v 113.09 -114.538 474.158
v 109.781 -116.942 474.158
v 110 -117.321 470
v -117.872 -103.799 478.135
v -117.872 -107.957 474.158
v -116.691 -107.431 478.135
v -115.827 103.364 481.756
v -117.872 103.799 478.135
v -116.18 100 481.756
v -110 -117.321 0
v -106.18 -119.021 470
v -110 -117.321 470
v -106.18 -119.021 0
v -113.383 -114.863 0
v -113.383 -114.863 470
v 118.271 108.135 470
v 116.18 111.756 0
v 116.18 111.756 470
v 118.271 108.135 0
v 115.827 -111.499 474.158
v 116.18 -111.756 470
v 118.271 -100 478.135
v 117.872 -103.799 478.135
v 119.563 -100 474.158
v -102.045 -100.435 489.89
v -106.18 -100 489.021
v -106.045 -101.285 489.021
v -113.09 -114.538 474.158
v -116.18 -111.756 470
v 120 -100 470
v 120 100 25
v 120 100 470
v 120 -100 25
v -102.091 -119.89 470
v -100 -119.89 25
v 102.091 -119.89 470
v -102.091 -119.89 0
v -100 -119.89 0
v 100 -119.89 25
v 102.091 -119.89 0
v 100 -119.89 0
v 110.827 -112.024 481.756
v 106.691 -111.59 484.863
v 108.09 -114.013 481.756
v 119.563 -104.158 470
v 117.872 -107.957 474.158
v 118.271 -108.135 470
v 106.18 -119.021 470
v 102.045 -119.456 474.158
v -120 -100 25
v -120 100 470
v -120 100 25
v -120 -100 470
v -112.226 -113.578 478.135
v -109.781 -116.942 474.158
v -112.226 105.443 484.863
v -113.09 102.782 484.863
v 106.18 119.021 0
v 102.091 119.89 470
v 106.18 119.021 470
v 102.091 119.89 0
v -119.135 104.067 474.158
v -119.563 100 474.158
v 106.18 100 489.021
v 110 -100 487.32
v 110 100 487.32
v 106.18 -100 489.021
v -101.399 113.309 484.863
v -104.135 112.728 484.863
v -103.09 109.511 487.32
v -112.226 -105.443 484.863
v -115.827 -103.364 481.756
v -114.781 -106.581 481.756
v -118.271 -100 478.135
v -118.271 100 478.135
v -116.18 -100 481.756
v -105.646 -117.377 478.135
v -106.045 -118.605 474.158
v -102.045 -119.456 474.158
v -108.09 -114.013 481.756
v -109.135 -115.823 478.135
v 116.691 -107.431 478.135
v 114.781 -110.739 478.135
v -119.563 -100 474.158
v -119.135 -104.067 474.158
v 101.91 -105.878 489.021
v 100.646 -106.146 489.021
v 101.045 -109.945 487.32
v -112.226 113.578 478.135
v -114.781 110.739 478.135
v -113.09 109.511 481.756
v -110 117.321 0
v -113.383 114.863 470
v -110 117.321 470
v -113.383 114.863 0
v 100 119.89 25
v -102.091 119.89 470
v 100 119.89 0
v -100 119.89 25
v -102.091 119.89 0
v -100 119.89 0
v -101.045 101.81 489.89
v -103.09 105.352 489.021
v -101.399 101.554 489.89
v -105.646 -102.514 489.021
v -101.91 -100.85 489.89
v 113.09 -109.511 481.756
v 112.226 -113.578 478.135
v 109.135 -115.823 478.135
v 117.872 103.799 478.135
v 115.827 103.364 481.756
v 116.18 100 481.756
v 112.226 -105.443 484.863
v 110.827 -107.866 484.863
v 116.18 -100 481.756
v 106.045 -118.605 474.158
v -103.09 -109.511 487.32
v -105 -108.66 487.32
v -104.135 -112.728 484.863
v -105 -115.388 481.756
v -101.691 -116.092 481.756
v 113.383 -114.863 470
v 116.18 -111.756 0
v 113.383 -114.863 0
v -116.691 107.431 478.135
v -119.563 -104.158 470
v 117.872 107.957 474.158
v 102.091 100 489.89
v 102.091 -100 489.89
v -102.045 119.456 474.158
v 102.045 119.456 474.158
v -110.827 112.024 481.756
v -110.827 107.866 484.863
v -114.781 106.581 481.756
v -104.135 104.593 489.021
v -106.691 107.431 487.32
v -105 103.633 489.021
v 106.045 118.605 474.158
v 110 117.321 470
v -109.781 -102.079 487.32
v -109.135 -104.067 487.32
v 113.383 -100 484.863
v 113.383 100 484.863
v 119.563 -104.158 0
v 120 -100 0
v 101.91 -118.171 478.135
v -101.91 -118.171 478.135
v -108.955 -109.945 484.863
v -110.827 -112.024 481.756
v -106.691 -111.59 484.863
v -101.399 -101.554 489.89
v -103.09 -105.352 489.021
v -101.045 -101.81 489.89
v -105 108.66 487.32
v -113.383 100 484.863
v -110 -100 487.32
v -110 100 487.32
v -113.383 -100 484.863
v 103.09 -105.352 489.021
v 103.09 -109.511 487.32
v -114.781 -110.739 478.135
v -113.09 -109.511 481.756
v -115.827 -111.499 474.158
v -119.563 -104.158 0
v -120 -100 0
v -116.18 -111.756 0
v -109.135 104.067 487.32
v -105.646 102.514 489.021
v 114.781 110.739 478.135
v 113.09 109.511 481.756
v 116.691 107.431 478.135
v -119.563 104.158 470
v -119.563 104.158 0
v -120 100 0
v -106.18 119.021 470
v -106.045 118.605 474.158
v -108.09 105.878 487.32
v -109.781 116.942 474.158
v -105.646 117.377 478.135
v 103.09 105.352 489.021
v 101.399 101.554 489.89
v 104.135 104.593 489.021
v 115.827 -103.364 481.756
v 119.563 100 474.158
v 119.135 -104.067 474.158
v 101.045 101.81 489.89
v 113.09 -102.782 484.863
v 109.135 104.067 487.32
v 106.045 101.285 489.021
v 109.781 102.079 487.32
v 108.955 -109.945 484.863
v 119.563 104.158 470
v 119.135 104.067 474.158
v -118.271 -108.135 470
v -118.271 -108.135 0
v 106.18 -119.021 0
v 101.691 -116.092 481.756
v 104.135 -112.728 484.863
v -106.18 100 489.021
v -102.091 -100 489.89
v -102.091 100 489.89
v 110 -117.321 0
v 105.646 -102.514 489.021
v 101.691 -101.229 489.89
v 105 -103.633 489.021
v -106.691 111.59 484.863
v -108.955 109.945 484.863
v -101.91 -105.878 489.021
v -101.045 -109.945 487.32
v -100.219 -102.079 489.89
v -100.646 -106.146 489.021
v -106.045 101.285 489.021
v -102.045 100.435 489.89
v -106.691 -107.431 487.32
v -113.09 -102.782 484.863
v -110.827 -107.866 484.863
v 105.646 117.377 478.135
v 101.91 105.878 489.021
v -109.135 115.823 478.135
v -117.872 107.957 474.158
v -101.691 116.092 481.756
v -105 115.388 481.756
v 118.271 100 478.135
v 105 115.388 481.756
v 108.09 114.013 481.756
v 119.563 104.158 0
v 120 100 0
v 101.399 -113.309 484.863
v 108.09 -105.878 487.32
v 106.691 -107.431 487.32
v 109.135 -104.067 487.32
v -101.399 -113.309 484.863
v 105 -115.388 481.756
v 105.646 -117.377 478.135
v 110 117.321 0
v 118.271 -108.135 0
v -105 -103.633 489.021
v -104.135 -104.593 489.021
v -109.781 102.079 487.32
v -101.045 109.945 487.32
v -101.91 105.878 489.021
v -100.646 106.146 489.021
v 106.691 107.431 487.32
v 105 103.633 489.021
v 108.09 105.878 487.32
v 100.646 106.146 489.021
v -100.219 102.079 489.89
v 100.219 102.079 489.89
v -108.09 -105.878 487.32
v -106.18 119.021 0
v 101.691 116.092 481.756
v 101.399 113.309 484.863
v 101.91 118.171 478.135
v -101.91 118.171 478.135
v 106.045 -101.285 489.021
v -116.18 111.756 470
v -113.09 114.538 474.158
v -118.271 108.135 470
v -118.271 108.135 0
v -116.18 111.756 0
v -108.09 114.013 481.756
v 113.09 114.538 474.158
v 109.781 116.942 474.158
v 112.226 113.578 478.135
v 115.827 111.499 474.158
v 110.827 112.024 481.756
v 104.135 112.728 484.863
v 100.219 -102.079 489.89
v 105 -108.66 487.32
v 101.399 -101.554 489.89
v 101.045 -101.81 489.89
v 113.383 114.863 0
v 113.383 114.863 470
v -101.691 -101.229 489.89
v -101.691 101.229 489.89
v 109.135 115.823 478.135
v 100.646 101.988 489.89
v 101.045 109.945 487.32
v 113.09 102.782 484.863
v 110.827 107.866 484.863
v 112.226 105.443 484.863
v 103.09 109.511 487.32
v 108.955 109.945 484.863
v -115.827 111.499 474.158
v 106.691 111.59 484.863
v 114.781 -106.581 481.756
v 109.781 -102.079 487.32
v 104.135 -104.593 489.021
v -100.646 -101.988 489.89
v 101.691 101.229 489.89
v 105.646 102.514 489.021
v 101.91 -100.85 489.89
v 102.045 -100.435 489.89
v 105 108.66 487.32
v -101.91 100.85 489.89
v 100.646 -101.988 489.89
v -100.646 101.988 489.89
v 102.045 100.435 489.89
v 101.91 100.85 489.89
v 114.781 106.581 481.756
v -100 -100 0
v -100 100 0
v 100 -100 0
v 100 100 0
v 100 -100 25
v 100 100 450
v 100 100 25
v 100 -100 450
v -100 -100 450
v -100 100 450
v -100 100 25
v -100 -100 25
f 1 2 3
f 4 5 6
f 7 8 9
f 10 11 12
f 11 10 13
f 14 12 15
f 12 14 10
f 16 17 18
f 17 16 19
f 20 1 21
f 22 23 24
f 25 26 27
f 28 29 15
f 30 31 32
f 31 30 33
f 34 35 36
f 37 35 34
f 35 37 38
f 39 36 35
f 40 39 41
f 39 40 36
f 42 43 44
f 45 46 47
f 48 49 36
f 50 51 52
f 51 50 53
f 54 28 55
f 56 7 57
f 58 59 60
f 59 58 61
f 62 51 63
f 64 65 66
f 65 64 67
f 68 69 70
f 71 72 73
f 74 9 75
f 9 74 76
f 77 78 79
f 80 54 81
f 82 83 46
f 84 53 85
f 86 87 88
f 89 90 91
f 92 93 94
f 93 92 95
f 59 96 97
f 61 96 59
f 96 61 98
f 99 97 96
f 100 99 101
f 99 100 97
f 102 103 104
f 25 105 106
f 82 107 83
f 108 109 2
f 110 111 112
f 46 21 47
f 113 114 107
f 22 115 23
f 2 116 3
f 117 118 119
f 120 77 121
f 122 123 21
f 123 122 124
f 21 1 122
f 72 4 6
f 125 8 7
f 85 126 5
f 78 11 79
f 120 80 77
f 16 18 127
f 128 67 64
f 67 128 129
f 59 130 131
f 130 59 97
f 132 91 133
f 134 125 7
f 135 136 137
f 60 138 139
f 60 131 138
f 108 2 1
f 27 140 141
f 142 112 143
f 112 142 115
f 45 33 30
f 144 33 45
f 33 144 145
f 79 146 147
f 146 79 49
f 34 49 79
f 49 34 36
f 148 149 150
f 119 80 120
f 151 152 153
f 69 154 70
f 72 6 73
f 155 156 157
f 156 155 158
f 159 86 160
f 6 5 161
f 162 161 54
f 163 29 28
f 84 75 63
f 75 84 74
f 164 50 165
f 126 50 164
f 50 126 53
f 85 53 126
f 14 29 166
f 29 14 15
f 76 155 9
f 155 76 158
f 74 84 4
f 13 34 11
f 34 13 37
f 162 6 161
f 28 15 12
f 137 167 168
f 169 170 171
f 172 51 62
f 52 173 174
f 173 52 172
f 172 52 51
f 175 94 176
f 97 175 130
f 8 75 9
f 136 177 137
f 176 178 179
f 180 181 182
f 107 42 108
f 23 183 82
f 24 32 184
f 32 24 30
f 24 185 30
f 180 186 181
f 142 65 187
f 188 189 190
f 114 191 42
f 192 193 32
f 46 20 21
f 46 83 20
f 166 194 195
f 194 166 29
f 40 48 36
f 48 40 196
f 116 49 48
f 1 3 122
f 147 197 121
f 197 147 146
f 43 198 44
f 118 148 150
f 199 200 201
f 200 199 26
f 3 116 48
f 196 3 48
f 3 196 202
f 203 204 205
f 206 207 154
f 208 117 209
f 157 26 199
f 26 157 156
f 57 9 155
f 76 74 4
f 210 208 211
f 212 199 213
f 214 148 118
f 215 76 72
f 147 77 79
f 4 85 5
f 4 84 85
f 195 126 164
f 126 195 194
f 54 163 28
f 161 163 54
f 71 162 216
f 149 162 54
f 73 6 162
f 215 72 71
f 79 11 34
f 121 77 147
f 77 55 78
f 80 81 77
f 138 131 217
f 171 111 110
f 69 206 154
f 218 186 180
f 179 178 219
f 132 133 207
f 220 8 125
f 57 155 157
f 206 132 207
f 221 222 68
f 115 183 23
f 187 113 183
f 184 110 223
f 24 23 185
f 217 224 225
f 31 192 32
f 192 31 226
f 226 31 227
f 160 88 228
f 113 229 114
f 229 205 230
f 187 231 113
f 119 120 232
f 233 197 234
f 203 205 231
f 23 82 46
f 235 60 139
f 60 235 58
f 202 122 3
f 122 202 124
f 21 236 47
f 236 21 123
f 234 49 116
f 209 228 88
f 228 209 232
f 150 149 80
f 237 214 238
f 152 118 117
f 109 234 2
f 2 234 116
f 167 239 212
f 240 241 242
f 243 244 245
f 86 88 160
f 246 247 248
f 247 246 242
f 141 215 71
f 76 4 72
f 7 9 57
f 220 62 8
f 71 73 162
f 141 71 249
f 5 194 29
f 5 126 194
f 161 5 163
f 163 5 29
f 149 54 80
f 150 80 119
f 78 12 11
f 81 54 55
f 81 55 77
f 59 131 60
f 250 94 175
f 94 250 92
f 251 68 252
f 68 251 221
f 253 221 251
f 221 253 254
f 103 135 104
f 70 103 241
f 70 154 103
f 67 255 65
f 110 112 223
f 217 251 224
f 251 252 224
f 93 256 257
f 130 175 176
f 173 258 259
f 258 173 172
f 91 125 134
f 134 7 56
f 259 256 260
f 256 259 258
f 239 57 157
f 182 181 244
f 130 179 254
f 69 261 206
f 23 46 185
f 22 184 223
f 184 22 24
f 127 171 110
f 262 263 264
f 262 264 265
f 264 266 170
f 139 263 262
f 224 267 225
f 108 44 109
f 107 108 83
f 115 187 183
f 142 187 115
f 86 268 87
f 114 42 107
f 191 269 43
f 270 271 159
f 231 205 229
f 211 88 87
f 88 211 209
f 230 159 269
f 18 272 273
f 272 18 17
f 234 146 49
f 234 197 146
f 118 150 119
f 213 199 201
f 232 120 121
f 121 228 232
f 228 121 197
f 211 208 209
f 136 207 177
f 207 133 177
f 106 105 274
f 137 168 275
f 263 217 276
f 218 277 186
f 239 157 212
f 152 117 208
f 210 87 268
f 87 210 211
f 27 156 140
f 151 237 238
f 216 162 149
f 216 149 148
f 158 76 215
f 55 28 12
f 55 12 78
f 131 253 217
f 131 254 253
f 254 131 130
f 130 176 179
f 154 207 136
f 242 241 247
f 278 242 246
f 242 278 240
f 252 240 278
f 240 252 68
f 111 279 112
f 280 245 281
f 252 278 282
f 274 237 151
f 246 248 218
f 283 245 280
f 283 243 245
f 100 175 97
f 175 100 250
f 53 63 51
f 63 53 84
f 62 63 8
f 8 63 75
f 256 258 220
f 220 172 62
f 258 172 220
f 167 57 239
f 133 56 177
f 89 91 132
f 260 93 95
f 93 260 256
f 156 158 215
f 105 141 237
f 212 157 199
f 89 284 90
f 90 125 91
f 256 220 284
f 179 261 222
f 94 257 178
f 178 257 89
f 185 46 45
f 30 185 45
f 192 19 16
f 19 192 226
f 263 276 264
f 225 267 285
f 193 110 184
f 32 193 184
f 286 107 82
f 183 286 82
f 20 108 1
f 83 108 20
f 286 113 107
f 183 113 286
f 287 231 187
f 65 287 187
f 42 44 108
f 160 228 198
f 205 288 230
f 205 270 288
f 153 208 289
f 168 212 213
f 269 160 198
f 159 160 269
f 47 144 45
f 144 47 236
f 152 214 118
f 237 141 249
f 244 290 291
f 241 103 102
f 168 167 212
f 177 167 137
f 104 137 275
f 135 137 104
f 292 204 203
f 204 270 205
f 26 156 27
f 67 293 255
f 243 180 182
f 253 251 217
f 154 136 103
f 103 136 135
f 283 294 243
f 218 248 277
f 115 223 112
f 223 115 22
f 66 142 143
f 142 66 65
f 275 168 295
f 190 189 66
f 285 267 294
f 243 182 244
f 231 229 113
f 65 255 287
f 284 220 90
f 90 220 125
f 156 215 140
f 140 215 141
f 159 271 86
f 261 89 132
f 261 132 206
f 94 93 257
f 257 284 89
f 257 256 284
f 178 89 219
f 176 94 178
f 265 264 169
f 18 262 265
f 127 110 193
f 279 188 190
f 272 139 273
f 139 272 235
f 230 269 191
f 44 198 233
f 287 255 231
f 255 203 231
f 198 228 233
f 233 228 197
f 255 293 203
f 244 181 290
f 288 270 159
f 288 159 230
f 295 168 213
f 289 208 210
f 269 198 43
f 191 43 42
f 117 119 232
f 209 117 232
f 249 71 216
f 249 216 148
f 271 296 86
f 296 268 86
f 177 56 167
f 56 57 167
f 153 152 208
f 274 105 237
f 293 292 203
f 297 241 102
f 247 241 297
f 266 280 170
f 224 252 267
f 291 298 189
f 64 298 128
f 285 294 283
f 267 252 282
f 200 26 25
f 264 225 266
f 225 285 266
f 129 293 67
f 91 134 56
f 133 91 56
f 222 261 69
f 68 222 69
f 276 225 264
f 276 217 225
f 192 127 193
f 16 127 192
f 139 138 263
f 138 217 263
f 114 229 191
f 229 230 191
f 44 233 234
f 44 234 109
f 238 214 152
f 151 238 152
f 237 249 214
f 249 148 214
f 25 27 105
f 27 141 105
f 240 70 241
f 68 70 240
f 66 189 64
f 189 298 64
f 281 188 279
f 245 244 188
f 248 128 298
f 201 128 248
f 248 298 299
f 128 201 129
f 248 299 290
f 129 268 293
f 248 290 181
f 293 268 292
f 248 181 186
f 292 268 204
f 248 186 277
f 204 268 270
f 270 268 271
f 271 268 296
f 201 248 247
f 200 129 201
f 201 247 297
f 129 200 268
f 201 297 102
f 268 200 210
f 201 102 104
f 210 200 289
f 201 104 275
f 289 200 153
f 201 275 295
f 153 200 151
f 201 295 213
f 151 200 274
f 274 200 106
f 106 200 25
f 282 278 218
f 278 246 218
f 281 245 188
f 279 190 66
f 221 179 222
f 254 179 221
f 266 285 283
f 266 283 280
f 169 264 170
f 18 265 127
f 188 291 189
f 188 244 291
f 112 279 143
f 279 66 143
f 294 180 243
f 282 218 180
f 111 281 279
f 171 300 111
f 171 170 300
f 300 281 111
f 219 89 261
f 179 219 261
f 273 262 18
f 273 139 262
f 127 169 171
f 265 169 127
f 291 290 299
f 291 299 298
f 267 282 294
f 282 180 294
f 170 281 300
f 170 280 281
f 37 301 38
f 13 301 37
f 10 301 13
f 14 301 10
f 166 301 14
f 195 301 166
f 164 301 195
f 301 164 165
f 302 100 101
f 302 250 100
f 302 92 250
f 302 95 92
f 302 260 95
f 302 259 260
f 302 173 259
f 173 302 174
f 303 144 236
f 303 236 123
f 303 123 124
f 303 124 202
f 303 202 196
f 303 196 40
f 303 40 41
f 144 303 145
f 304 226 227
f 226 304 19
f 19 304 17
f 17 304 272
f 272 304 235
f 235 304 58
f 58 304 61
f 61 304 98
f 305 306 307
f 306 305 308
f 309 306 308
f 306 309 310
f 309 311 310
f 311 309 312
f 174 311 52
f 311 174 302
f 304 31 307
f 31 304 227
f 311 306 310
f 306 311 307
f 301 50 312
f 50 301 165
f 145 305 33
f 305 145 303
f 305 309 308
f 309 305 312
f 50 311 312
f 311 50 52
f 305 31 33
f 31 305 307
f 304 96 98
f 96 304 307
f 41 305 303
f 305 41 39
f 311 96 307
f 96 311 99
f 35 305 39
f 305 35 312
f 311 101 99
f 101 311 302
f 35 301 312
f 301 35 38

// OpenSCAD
module body()
{
	difference()
	{
		// a round box
		intersection() {
			hull() for (x = [-100, +100], y = [-100, +100], z = [-20, 470])
				translate([x, y, z]) sphere(20);
			translate([0, 0, 250]) cube(500, center=true);
		}

		// inside
		cube([200, 200, 900], center = true);

		// free space at the bottom
		cube([300, 200, 50], center = true);
		cube([200, 300, 50], center = true);
	}
}

module window_stencil()
{
	for (dim = [ [300, 150, 150], [150, 300, 150] ], z = [ 150, 350 ])
		translate([ 0, 0, z ]) cube(dim, center = true);
}

module booth_metal()
{
	render(convexity = 10)
	difference()
	{
		body();
		window_stencil();
	}
}

module booth_glass()
{
	render(convexity = 10)
	intersection()
	{
		body();
		window_stencil();
	}
}

color("gray") booth_metal();
color("blue", 0.2) booth_glass();
